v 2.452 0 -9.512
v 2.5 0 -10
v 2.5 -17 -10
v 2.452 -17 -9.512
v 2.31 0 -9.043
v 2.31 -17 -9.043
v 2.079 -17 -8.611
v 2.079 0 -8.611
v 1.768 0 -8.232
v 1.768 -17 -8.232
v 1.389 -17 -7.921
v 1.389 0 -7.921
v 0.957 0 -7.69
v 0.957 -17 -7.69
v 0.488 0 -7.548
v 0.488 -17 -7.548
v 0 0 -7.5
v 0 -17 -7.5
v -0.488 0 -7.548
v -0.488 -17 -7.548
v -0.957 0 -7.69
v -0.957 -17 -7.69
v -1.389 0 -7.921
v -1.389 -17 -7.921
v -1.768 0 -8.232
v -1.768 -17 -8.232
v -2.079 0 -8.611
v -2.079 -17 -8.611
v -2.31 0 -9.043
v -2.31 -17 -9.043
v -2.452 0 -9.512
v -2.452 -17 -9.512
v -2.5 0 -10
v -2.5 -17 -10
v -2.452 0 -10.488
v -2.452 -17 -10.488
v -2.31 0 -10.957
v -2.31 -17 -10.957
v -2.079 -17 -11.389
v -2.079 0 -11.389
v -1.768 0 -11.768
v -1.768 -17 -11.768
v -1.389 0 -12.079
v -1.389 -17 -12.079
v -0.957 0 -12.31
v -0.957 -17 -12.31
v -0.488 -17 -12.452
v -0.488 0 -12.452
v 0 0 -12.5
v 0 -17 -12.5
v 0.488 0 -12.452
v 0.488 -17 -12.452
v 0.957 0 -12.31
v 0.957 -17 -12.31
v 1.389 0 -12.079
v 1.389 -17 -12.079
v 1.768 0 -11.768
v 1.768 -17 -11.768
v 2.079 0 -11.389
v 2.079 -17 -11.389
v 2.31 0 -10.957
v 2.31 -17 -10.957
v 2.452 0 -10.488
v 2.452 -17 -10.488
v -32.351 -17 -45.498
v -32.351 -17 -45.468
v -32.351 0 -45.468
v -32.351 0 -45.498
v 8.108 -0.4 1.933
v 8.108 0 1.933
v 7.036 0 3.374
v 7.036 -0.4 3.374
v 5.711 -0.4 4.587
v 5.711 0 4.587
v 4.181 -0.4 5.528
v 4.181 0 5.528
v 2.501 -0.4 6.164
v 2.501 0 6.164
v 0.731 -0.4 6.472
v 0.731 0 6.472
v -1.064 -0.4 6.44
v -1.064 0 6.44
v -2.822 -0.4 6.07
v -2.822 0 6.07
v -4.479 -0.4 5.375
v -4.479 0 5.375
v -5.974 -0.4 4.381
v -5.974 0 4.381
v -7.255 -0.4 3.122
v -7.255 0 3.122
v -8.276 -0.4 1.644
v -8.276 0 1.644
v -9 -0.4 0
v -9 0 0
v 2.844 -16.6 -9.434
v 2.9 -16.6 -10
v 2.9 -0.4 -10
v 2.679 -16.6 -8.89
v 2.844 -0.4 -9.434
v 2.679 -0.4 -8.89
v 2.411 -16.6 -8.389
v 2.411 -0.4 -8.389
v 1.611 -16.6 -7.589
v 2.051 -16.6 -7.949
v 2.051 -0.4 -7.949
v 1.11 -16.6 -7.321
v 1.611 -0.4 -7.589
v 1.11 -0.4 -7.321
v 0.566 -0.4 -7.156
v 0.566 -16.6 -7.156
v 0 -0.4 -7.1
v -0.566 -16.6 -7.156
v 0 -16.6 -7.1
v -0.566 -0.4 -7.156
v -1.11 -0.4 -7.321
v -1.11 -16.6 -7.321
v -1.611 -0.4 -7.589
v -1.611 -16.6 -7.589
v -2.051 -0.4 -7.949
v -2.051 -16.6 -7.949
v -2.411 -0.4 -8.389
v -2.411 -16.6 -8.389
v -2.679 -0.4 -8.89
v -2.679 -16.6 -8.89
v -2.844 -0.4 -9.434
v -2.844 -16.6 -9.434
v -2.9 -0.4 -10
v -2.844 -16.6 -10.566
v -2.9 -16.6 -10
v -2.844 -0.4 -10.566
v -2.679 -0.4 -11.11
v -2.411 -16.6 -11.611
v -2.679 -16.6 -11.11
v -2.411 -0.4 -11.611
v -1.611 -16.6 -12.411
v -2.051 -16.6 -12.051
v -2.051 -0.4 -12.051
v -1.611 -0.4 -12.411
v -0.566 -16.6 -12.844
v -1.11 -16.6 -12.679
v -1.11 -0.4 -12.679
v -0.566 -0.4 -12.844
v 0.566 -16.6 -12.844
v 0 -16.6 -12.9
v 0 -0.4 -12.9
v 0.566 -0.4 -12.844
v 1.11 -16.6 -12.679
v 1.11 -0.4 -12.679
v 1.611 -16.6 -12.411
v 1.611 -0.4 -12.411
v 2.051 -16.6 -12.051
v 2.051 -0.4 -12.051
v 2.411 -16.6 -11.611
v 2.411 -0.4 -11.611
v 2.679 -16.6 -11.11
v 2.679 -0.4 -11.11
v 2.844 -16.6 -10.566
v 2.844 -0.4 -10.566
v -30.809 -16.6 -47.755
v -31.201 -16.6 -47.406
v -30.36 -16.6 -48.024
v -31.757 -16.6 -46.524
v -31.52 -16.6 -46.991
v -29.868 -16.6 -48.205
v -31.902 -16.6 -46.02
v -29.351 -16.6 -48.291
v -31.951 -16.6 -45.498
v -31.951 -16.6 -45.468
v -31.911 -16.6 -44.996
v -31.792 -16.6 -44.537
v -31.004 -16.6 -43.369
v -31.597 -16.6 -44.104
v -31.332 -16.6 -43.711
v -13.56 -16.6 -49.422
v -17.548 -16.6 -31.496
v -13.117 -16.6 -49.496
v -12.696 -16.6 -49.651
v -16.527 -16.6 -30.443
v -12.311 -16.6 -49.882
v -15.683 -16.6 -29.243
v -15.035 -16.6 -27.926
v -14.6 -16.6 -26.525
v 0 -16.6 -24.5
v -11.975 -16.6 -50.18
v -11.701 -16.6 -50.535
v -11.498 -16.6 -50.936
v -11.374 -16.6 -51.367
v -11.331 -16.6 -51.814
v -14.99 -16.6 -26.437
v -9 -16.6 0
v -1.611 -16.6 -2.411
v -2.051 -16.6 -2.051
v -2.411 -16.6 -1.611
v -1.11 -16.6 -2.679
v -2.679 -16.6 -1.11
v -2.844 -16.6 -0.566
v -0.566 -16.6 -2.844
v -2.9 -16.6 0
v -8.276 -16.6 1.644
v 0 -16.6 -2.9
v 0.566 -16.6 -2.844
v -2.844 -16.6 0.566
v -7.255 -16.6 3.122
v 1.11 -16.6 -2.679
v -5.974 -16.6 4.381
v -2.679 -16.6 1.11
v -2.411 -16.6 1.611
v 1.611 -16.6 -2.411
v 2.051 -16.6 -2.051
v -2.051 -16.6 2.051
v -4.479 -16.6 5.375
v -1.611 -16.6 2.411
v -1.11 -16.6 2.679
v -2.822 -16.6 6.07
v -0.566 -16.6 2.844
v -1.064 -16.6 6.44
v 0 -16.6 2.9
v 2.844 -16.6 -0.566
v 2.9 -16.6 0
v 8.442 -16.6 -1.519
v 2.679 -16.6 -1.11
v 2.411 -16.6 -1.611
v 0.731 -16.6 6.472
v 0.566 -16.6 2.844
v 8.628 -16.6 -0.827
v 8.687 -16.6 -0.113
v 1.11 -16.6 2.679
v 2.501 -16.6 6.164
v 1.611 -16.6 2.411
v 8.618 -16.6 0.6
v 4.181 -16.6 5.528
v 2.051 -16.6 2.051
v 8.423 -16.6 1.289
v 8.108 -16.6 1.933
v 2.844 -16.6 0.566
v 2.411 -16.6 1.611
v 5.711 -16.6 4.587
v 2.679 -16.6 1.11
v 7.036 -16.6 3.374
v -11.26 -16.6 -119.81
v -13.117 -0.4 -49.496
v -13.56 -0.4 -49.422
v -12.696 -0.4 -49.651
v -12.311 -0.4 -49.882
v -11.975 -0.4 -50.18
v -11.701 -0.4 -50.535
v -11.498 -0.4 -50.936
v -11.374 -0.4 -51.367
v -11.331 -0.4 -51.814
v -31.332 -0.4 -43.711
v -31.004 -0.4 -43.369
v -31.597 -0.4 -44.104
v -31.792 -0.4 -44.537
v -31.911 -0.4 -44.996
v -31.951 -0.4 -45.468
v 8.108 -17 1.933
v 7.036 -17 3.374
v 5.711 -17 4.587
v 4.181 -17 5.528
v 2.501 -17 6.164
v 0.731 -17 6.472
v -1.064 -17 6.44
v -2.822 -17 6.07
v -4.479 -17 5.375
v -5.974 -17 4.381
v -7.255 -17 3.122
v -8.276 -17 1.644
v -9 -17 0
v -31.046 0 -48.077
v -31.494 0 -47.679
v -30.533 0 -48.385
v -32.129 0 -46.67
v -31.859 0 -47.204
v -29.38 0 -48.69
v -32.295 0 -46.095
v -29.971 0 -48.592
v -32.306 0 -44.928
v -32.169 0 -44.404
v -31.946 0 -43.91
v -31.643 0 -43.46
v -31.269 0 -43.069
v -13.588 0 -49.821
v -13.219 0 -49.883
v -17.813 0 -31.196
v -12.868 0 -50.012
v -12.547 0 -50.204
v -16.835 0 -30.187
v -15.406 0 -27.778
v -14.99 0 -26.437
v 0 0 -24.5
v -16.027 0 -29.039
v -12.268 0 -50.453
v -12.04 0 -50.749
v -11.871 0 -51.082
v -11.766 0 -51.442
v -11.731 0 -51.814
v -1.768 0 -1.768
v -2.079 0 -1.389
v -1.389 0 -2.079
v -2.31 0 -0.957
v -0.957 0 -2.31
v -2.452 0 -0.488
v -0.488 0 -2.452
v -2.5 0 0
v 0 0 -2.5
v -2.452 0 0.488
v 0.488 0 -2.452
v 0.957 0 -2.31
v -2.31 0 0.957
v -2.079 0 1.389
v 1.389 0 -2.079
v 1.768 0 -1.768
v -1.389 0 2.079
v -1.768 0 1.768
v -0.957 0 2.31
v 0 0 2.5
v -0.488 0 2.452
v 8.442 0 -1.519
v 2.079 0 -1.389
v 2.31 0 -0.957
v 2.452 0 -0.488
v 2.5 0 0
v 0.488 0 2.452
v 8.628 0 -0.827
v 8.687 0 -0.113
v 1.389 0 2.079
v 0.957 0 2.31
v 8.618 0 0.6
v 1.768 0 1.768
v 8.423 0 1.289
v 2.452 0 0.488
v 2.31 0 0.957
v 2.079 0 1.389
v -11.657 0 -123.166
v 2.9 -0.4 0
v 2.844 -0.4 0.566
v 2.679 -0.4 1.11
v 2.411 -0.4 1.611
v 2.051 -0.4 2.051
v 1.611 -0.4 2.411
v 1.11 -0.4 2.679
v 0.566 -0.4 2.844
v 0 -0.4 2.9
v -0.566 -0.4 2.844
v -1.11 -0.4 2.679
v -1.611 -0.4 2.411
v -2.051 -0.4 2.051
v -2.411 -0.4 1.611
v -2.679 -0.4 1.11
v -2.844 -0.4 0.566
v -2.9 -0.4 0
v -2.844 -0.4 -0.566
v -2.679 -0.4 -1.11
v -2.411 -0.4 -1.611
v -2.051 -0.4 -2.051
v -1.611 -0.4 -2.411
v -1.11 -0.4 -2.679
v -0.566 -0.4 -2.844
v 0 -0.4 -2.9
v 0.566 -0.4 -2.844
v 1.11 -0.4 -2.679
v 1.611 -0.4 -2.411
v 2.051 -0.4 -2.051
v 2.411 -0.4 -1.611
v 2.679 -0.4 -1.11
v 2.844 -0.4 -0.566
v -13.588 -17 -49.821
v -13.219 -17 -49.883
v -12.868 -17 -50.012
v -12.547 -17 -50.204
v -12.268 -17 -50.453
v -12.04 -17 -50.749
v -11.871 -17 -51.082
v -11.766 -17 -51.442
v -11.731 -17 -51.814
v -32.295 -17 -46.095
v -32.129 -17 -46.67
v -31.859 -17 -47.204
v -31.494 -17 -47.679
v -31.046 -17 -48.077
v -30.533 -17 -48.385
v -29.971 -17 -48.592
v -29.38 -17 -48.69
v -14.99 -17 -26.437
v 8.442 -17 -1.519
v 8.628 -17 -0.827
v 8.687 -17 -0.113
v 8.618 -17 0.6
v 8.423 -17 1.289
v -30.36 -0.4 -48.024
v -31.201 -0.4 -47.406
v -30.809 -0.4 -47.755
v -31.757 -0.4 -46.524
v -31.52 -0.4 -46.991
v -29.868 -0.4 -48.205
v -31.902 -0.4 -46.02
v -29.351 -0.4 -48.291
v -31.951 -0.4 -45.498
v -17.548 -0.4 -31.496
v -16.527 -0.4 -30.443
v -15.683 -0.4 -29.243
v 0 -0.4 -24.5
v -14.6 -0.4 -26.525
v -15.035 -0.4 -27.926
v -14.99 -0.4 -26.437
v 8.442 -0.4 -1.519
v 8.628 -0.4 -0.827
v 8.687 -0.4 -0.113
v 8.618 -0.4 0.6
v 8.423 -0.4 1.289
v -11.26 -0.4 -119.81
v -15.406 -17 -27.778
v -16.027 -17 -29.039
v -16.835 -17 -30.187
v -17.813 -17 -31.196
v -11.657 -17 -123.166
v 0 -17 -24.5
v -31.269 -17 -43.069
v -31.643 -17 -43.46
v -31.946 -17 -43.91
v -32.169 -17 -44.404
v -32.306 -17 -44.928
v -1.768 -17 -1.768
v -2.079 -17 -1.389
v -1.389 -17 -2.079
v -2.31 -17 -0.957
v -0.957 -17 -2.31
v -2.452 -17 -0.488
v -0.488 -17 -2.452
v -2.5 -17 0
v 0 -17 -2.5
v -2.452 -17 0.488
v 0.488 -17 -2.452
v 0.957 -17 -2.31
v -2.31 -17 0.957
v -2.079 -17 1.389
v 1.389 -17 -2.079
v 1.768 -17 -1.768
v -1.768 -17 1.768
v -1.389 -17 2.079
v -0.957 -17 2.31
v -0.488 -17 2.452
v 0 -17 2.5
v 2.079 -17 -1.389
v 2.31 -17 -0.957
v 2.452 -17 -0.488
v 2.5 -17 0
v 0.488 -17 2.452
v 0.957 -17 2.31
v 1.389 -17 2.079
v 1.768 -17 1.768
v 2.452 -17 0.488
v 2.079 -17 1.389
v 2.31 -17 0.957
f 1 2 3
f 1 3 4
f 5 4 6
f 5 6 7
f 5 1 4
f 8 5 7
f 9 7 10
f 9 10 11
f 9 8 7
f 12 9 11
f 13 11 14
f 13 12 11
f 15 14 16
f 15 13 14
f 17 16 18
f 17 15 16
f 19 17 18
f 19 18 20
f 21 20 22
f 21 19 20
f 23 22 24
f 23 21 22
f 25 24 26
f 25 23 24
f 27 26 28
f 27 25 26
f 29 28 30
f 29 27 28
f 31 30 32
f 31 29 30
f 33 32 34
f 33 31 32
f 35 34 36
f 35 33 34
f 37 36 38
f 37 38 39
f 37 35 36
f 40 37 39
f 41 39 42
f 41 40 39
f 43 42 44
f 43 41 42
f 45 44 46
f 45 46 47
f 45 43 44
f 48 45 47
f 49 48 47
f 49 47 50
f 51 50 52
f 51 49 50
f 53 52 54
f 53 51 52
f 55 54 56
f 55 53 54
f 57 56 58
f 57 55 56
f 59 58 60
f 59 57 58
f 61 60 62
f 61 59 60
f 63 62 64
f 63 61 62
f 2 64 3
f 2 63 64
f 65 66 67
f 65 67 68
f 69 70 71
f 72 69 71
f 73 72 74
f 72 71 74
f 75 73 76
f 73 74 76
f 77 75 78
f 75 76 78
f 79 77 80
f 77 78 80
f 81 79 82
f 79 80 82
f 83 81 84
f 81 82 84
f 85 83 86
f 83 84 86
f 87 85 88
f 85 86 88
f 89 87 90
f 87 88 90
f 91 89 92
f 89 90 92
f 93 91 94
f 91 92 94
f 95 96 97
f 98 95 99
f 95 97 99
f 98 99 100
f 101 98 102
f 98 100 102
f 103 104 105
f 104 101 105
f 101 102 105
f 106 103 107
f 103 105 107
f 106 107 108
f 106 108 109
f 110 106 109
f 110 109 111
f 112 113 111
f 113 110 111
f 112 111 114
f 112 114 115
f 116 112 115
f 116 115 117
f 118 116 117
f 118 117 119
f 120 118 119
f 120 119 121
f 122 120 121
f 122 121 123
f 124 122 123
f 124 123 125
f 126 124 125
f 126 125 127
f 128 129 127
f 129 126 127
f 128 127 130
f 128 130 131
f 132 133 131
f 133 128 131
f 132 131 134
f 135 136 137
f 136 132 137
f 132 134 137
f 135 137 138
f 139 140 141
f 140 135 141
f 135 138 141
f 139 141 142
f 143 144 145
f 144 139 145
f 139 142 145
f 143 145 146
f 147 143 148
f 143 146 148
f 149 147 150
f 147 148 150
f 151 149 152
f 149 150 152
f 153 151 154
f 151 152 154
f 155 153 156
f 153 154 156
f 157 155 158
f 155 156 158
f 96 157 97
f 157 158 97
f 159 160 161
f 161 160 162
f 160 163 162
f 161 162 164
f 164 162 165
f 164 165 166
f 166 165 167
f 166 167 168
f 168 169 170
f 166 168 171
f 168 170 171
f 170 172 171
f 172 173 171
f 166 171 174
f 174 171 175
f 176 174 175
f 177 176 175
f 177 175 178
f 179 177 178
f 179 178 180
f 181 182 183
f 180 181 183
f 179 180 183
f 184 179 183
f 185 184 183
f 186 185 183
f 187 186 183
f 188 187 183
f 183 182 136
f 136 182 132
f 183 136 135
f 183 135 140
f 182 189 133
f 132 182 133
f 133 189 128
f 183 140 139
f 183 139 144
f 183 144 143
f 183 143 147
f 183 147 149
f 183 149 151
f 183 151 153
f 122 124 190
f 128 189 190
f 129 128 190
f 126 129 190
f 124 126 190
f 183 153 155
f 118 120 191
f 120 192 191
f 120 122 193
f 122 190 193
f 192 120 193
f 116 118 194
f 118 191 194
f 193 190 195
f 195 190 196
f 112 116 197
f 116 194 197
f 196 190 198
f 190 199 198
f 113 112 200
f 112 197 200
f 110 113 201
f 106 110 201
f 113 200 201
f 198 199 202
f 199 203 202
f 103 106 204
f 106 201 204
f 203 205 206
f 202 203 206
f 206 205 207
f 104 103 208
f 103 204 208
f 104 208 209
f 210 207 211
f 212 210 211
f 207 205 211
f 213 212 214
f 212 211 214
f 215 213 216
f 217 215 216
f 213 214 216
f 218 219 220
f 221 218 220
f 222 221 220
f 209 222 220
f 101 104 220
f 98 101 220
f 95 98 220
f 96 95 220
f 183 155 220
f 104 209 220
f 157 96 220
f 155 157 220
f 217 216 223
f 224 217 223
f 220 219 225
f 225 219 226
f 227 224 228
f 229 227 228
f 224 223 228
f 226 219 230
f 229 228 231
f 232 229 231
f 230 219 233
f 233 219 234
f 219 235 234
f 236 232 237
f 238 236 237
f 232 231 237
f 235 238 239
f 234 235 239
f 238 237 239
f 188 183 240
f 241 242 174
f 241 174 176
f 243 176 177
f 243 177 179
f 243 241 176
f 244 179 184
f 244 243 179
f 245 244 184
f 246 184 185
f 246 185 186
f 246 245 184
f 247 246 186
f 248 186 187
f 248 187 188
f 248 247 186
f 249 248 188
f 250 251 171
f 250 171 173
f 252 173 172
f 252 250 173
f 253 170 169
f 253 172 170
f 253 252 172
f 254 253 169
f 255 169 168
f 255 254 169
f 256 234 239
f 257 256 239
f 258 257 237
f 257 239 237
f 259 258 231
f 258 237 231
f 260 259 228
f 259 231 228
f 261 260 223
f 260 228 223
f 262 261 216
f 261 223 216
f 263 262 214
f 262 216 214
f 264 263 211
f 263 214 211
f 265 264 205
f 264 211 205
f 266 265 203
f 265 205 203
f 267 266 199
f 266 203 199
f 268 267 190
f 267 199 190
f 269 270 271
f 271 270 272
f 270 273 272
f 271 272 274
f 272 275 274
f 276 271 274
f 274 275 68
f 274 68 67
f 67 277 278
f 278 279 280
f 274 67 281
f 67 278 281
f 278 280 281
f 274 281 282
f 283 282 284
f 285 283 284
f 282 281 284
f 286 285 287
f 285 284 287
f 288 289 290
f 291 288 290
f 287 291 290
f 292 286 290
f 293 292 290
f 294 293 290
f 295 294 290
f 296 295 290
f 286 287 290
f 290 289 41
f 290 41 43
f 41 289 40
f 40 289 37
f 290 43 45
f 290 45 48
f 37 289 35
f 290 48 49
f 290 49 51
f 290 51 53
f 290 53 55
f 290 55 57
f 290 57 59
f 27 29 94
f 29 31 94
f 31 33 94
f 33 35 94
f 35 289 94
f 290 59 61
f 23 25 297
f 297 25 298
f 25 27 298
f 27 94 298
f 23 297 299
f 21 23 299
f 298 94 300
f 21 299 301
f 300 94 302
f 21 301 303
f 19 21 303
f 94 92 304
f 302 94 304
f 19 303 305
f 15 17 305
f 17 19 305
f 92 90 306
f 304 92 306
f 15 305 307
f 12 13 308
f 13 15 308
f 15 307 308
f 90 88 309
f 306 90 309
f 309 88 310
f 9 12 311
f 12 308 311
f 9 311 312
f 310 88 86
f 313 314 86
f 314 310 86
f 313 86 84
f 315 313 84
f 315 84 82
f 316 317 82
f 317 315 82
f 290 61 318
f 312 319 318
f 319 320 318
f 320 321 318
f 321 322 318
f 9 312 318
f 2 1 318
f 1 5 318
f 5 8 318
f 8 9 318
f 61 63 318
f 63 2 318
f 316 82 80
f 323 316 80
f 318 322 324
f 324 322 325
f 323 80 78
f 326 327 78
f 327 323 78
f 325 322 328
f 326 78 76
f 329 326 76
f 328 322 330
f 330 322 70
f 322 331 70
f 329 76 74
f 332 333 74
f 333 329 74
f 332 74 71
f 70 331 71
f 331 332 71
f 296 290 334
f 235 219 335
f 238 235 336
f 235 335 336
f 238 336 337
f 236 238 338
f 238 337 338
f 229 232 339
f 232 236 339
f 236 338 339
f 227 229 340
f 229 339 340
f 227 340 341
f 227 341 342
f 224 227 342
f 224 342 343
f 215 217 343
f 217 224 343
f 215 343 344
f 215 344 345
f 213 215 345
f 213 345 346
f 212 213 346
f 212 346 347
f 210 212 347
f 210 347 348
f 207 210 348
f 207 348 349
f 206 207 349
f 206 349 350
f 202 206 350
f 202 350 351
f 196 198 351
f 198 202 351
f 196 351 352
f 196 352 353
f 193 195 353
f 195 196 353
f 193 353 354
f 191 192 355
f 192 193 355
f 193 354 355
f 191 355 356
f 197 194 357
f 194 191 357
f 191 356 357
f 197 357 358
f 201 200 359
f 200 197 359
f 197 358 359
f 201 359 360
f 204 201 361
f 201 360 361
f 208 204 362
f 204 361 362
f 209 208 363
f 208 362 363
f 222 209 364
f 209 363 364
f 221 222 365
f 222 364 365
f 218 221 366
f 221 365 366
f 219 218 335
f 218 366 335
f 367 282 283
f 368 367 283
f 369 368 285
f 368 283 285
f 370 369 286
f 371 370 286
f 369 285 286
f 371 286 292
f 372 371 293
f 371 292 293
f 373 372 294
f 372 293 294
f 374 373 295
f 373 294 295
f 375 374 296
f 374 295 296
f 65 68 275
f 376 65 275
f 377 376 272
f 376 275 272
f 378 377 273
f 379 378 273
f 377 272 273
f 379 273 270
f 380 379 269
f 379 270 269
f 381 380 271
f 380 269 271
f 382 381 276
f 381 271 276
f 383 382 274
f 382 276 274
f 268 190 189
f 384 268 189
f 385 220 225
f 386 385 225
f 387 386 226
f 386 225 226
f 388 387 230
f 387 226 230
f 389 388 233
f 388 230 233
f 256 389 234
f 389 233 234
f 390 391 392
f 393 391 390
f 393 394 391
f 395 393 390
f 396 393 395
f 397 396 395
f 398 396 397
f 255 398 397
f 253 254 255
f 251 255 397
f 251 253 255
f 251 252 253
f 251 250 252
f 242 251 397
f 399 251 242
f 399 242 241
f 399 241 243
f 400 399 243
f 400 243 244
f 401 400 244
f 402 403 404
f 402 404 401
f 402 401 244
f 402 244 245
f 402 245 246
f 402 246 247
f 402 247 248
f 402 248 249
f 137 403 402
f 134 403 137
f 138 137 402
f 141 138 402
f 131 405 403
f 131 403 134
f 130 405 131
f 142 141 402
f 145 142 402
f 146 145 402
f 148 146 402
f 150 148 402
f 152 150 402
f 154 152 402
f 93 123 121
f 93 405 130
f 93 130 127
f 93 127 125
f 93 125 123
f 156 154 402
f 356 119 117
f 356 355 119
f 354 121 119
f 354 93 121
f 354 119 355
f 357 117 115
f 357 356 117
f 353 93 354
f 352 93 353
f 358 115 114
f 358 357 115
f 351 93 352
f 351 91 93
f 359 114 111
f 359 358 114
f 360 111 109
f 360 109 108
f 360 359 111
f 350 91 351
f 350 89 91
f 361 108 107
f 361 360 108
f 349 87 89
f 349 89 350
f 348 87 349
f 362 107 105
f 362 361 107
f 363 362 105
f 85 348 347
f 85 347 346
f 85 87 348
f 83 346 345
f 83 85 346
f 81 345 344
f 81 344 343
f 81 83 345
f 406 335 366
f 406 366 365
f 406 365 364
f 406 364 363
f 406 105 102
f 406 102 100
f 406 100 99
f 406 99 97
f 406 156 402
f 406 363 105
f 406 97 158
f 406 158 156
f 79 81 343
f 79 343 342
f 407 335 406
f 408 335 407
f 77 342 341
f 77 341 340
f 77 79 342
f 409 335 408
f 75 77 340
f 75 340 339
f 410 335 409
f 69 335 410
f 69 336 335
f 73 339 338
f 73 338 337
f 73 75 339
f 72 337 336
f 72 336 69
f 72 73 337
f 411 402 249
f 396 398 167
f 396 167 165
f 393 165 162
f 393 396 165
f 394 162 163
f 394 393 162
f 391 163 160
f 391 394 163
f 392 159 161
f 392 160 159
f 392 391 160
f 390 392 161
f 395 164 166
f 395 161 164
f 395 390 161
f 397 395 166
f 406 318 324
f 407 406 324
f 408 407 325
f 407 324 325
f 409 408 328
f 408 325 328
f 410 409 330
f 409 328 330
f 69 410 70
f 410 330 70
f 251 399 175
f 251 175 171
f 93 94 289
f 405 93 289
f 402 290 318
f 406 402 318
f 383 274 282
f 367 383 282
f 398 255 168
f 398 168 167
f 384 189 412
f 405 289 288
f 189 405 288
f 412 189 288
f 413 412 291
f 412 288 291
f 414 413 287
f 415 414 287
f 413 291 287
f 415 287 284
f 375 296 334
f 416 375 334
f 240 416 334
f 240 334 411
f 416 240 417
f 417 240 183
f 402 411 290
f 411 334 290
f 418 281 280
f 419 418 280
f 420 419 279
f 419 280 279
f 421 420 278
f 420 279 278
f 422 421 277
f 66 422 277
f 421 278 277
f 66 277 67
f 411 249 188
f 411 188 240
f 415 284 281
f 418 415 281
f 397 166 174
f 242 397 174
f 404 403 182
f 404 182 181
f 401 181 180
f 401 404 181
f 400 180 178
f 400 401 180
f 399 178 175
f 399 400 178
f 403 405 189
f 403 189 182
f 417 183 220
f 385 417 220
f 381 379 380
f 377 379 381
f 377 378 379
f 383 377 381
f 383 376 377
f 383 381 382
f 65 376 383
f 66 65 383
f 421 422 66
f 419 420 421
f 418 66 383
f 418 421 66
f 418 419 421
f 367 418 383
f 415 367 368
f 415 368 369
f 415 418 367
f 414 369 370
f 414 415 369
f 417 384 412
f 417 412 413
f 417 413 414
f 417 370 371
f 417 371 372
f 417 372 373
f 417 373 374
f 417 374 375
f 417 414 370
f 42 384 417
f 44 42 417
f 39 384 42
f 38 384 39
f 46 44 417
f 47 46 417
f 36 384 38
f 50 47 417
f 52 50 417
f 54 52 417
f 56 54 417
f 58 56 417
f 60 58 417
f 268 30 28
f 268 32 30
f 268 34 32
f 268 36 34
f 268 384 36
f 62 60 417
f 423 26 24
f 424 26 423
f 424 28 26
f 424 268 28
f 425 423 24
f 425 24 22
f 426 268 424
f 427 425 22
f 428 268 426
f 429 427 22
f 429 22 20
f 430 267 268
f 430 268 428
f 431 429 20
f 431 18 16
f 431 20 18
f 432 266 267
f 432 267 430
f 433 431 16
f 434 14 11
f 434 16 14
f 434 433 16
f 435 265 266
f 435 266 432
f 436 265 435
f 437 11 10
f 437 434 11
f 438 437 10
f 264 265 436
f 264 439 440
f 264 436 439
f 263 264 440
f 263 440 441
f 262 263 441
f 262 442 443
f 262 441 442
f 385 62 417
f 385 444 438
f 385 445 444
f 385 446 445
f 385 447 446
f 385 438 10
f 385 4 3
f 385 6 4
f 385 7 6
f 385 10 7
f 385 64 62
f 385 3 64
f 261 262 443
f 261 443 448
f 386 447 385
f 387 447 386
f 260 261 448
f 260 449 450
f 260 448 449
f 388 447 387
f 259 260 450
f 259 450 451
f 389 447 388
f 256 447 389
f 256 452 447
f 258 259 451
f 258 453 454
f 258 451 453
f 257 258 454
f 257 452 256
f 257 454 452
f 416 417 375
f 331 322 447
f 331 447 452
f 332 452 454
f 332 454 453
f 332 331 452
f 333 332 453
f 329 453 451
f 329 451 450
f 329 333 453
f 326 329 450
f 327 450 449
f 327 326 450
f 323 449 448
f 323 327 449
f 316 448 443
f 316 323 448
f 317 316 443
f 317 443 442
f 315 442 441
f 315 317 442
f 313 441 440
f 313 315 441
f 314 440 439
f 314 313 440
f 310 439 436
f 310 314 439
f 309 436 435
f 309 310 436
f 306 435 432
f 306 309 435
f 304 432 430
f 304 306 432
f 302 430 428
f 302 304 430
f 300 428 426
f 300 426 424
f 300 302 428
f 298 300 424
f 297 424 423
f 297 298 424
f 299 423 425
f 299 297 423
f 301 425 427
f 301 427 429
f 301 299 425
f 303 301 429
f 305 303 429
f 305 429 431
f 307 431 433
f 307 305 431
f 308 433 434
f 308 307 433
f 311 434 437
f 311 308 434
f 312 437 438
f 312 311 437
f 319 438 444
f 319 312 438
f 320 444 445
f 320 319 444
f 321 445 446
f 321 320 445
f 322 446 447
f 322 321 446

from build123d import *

# Parameters (mm, degrees)
F0_R     = 2.5
F1_DEPTH = 17
F2_T     = 0.4


# Not quite as in the source:
# - a shell that OpenCascade refuses in one call is made with other operations: the cavity is built on its own and cut out


with BuildPart() as f1:
    # F0 (on Front) → F1 (new body)
    with BuildSketch(Plane.XZ):
        with BuildLine():
            ThreePointArc((8.4418530872, -1.5193999292), (8.6686009191, 0.2448895048), (8.1079887938, 1.933038145))
            ThreePointArc((8.1079887938, 1.933038145), (-1.0644623598, 6.4400537212), (-9, 0))
            Line((-9, 0), (-14.990051355, -26.4365585686))
            ThreePointArc((-14.990051355, -26.4365585686), (-16.0266215588, -29.0388056628), (-17.8130271161, -31.1963326989))
            Line((-17.8130271161, -31.1963326989), (-31.2685862961, -43.0686485372))
            ThreePointArc((-31.2685862961, -43.0686485372), (-32.0681766379, -44.1518925803), (-32.3514207584, -45.4681505868))
            Line((-32.3514207584, -45.4681505868), (-32.3514207584, -45.4984797908))
            ThreePointArc((-32.3514207584, -45.4984797908), (-31.4935858742, -47.678906944), (-29.3800066519, -48.6903050507))
            Line((-29.3800066519, -48.6903050507), (-13.5882116102, -49.8212509157))
            ThreePointArc((-13.5882116102, -49.8212509157), (-12.2679323329, -50.4526148934), (-11.7310788719, -51.8140649305))
            Line((-11.7310788719, -51.8140649305), (-11.6569881297, -123.1658389017))
            Line((-11.6569881297, -123.1658389017), (0, -24.5))
            Line((0, -24.5), (8.4418530872, -1.5193999292))
        make_face()
        with Locations((0, -10)):
            Circle(F0_R, mode=Mode.SUBTRACT)
        Circle(F0_R, mode=Mode.SUBTRACT)
    extrude(amount=F1_DEPTH)

    # F2: shell of thickness 0.4, made by hand


with BuildPart() as f2_core1:
    # F2_t2: copy of F1
    add(f1.part)

    # the walls: a layer under each face that stays
    f2_faces = [f2_core1.faces().sort_by_distance(p)[0] for p in [
        (-16.0266215588, -8.5, -29.0388056628),
        (-24.5408067061, -8.5, -37.1324906181),
        (-32.0681766379, -8.5, -44.1518925803),
        (-32.3514207584, -8.5, -45.4833151888),
        (-31.4935858742, -8.5, -47.678906944),
        (-21.484109131, -8.5, -49.2557779832),
        (-12.2679323329, -8.5, -50.4526148934),
        (-11.6940335008, -8.5, -87.4899519161),
        (-2.5, -8.5, -10),
        (-2.5, -8.5, 0),
        (-11.8321233546, 0, -15.1109731503),
        (-11.8321233546, -17, -15.1109731503),
    ]]
    thicken(f2_faces, amount=-F2_T, mode=Mode.SUBTRACT)


with BuildPart() as f1_1:
    add(f1.part)

    # what is left inside the walls is the cavity
    f2_cavity = [f2_core1.part.solids().sort_by_distance(p)[0] for p in [
        (-5.634209, -11.2, -72.154379),
    ]]
    add(f2_cavity, mode=Mode.SUBTRACT)


solid = f1_1.part
